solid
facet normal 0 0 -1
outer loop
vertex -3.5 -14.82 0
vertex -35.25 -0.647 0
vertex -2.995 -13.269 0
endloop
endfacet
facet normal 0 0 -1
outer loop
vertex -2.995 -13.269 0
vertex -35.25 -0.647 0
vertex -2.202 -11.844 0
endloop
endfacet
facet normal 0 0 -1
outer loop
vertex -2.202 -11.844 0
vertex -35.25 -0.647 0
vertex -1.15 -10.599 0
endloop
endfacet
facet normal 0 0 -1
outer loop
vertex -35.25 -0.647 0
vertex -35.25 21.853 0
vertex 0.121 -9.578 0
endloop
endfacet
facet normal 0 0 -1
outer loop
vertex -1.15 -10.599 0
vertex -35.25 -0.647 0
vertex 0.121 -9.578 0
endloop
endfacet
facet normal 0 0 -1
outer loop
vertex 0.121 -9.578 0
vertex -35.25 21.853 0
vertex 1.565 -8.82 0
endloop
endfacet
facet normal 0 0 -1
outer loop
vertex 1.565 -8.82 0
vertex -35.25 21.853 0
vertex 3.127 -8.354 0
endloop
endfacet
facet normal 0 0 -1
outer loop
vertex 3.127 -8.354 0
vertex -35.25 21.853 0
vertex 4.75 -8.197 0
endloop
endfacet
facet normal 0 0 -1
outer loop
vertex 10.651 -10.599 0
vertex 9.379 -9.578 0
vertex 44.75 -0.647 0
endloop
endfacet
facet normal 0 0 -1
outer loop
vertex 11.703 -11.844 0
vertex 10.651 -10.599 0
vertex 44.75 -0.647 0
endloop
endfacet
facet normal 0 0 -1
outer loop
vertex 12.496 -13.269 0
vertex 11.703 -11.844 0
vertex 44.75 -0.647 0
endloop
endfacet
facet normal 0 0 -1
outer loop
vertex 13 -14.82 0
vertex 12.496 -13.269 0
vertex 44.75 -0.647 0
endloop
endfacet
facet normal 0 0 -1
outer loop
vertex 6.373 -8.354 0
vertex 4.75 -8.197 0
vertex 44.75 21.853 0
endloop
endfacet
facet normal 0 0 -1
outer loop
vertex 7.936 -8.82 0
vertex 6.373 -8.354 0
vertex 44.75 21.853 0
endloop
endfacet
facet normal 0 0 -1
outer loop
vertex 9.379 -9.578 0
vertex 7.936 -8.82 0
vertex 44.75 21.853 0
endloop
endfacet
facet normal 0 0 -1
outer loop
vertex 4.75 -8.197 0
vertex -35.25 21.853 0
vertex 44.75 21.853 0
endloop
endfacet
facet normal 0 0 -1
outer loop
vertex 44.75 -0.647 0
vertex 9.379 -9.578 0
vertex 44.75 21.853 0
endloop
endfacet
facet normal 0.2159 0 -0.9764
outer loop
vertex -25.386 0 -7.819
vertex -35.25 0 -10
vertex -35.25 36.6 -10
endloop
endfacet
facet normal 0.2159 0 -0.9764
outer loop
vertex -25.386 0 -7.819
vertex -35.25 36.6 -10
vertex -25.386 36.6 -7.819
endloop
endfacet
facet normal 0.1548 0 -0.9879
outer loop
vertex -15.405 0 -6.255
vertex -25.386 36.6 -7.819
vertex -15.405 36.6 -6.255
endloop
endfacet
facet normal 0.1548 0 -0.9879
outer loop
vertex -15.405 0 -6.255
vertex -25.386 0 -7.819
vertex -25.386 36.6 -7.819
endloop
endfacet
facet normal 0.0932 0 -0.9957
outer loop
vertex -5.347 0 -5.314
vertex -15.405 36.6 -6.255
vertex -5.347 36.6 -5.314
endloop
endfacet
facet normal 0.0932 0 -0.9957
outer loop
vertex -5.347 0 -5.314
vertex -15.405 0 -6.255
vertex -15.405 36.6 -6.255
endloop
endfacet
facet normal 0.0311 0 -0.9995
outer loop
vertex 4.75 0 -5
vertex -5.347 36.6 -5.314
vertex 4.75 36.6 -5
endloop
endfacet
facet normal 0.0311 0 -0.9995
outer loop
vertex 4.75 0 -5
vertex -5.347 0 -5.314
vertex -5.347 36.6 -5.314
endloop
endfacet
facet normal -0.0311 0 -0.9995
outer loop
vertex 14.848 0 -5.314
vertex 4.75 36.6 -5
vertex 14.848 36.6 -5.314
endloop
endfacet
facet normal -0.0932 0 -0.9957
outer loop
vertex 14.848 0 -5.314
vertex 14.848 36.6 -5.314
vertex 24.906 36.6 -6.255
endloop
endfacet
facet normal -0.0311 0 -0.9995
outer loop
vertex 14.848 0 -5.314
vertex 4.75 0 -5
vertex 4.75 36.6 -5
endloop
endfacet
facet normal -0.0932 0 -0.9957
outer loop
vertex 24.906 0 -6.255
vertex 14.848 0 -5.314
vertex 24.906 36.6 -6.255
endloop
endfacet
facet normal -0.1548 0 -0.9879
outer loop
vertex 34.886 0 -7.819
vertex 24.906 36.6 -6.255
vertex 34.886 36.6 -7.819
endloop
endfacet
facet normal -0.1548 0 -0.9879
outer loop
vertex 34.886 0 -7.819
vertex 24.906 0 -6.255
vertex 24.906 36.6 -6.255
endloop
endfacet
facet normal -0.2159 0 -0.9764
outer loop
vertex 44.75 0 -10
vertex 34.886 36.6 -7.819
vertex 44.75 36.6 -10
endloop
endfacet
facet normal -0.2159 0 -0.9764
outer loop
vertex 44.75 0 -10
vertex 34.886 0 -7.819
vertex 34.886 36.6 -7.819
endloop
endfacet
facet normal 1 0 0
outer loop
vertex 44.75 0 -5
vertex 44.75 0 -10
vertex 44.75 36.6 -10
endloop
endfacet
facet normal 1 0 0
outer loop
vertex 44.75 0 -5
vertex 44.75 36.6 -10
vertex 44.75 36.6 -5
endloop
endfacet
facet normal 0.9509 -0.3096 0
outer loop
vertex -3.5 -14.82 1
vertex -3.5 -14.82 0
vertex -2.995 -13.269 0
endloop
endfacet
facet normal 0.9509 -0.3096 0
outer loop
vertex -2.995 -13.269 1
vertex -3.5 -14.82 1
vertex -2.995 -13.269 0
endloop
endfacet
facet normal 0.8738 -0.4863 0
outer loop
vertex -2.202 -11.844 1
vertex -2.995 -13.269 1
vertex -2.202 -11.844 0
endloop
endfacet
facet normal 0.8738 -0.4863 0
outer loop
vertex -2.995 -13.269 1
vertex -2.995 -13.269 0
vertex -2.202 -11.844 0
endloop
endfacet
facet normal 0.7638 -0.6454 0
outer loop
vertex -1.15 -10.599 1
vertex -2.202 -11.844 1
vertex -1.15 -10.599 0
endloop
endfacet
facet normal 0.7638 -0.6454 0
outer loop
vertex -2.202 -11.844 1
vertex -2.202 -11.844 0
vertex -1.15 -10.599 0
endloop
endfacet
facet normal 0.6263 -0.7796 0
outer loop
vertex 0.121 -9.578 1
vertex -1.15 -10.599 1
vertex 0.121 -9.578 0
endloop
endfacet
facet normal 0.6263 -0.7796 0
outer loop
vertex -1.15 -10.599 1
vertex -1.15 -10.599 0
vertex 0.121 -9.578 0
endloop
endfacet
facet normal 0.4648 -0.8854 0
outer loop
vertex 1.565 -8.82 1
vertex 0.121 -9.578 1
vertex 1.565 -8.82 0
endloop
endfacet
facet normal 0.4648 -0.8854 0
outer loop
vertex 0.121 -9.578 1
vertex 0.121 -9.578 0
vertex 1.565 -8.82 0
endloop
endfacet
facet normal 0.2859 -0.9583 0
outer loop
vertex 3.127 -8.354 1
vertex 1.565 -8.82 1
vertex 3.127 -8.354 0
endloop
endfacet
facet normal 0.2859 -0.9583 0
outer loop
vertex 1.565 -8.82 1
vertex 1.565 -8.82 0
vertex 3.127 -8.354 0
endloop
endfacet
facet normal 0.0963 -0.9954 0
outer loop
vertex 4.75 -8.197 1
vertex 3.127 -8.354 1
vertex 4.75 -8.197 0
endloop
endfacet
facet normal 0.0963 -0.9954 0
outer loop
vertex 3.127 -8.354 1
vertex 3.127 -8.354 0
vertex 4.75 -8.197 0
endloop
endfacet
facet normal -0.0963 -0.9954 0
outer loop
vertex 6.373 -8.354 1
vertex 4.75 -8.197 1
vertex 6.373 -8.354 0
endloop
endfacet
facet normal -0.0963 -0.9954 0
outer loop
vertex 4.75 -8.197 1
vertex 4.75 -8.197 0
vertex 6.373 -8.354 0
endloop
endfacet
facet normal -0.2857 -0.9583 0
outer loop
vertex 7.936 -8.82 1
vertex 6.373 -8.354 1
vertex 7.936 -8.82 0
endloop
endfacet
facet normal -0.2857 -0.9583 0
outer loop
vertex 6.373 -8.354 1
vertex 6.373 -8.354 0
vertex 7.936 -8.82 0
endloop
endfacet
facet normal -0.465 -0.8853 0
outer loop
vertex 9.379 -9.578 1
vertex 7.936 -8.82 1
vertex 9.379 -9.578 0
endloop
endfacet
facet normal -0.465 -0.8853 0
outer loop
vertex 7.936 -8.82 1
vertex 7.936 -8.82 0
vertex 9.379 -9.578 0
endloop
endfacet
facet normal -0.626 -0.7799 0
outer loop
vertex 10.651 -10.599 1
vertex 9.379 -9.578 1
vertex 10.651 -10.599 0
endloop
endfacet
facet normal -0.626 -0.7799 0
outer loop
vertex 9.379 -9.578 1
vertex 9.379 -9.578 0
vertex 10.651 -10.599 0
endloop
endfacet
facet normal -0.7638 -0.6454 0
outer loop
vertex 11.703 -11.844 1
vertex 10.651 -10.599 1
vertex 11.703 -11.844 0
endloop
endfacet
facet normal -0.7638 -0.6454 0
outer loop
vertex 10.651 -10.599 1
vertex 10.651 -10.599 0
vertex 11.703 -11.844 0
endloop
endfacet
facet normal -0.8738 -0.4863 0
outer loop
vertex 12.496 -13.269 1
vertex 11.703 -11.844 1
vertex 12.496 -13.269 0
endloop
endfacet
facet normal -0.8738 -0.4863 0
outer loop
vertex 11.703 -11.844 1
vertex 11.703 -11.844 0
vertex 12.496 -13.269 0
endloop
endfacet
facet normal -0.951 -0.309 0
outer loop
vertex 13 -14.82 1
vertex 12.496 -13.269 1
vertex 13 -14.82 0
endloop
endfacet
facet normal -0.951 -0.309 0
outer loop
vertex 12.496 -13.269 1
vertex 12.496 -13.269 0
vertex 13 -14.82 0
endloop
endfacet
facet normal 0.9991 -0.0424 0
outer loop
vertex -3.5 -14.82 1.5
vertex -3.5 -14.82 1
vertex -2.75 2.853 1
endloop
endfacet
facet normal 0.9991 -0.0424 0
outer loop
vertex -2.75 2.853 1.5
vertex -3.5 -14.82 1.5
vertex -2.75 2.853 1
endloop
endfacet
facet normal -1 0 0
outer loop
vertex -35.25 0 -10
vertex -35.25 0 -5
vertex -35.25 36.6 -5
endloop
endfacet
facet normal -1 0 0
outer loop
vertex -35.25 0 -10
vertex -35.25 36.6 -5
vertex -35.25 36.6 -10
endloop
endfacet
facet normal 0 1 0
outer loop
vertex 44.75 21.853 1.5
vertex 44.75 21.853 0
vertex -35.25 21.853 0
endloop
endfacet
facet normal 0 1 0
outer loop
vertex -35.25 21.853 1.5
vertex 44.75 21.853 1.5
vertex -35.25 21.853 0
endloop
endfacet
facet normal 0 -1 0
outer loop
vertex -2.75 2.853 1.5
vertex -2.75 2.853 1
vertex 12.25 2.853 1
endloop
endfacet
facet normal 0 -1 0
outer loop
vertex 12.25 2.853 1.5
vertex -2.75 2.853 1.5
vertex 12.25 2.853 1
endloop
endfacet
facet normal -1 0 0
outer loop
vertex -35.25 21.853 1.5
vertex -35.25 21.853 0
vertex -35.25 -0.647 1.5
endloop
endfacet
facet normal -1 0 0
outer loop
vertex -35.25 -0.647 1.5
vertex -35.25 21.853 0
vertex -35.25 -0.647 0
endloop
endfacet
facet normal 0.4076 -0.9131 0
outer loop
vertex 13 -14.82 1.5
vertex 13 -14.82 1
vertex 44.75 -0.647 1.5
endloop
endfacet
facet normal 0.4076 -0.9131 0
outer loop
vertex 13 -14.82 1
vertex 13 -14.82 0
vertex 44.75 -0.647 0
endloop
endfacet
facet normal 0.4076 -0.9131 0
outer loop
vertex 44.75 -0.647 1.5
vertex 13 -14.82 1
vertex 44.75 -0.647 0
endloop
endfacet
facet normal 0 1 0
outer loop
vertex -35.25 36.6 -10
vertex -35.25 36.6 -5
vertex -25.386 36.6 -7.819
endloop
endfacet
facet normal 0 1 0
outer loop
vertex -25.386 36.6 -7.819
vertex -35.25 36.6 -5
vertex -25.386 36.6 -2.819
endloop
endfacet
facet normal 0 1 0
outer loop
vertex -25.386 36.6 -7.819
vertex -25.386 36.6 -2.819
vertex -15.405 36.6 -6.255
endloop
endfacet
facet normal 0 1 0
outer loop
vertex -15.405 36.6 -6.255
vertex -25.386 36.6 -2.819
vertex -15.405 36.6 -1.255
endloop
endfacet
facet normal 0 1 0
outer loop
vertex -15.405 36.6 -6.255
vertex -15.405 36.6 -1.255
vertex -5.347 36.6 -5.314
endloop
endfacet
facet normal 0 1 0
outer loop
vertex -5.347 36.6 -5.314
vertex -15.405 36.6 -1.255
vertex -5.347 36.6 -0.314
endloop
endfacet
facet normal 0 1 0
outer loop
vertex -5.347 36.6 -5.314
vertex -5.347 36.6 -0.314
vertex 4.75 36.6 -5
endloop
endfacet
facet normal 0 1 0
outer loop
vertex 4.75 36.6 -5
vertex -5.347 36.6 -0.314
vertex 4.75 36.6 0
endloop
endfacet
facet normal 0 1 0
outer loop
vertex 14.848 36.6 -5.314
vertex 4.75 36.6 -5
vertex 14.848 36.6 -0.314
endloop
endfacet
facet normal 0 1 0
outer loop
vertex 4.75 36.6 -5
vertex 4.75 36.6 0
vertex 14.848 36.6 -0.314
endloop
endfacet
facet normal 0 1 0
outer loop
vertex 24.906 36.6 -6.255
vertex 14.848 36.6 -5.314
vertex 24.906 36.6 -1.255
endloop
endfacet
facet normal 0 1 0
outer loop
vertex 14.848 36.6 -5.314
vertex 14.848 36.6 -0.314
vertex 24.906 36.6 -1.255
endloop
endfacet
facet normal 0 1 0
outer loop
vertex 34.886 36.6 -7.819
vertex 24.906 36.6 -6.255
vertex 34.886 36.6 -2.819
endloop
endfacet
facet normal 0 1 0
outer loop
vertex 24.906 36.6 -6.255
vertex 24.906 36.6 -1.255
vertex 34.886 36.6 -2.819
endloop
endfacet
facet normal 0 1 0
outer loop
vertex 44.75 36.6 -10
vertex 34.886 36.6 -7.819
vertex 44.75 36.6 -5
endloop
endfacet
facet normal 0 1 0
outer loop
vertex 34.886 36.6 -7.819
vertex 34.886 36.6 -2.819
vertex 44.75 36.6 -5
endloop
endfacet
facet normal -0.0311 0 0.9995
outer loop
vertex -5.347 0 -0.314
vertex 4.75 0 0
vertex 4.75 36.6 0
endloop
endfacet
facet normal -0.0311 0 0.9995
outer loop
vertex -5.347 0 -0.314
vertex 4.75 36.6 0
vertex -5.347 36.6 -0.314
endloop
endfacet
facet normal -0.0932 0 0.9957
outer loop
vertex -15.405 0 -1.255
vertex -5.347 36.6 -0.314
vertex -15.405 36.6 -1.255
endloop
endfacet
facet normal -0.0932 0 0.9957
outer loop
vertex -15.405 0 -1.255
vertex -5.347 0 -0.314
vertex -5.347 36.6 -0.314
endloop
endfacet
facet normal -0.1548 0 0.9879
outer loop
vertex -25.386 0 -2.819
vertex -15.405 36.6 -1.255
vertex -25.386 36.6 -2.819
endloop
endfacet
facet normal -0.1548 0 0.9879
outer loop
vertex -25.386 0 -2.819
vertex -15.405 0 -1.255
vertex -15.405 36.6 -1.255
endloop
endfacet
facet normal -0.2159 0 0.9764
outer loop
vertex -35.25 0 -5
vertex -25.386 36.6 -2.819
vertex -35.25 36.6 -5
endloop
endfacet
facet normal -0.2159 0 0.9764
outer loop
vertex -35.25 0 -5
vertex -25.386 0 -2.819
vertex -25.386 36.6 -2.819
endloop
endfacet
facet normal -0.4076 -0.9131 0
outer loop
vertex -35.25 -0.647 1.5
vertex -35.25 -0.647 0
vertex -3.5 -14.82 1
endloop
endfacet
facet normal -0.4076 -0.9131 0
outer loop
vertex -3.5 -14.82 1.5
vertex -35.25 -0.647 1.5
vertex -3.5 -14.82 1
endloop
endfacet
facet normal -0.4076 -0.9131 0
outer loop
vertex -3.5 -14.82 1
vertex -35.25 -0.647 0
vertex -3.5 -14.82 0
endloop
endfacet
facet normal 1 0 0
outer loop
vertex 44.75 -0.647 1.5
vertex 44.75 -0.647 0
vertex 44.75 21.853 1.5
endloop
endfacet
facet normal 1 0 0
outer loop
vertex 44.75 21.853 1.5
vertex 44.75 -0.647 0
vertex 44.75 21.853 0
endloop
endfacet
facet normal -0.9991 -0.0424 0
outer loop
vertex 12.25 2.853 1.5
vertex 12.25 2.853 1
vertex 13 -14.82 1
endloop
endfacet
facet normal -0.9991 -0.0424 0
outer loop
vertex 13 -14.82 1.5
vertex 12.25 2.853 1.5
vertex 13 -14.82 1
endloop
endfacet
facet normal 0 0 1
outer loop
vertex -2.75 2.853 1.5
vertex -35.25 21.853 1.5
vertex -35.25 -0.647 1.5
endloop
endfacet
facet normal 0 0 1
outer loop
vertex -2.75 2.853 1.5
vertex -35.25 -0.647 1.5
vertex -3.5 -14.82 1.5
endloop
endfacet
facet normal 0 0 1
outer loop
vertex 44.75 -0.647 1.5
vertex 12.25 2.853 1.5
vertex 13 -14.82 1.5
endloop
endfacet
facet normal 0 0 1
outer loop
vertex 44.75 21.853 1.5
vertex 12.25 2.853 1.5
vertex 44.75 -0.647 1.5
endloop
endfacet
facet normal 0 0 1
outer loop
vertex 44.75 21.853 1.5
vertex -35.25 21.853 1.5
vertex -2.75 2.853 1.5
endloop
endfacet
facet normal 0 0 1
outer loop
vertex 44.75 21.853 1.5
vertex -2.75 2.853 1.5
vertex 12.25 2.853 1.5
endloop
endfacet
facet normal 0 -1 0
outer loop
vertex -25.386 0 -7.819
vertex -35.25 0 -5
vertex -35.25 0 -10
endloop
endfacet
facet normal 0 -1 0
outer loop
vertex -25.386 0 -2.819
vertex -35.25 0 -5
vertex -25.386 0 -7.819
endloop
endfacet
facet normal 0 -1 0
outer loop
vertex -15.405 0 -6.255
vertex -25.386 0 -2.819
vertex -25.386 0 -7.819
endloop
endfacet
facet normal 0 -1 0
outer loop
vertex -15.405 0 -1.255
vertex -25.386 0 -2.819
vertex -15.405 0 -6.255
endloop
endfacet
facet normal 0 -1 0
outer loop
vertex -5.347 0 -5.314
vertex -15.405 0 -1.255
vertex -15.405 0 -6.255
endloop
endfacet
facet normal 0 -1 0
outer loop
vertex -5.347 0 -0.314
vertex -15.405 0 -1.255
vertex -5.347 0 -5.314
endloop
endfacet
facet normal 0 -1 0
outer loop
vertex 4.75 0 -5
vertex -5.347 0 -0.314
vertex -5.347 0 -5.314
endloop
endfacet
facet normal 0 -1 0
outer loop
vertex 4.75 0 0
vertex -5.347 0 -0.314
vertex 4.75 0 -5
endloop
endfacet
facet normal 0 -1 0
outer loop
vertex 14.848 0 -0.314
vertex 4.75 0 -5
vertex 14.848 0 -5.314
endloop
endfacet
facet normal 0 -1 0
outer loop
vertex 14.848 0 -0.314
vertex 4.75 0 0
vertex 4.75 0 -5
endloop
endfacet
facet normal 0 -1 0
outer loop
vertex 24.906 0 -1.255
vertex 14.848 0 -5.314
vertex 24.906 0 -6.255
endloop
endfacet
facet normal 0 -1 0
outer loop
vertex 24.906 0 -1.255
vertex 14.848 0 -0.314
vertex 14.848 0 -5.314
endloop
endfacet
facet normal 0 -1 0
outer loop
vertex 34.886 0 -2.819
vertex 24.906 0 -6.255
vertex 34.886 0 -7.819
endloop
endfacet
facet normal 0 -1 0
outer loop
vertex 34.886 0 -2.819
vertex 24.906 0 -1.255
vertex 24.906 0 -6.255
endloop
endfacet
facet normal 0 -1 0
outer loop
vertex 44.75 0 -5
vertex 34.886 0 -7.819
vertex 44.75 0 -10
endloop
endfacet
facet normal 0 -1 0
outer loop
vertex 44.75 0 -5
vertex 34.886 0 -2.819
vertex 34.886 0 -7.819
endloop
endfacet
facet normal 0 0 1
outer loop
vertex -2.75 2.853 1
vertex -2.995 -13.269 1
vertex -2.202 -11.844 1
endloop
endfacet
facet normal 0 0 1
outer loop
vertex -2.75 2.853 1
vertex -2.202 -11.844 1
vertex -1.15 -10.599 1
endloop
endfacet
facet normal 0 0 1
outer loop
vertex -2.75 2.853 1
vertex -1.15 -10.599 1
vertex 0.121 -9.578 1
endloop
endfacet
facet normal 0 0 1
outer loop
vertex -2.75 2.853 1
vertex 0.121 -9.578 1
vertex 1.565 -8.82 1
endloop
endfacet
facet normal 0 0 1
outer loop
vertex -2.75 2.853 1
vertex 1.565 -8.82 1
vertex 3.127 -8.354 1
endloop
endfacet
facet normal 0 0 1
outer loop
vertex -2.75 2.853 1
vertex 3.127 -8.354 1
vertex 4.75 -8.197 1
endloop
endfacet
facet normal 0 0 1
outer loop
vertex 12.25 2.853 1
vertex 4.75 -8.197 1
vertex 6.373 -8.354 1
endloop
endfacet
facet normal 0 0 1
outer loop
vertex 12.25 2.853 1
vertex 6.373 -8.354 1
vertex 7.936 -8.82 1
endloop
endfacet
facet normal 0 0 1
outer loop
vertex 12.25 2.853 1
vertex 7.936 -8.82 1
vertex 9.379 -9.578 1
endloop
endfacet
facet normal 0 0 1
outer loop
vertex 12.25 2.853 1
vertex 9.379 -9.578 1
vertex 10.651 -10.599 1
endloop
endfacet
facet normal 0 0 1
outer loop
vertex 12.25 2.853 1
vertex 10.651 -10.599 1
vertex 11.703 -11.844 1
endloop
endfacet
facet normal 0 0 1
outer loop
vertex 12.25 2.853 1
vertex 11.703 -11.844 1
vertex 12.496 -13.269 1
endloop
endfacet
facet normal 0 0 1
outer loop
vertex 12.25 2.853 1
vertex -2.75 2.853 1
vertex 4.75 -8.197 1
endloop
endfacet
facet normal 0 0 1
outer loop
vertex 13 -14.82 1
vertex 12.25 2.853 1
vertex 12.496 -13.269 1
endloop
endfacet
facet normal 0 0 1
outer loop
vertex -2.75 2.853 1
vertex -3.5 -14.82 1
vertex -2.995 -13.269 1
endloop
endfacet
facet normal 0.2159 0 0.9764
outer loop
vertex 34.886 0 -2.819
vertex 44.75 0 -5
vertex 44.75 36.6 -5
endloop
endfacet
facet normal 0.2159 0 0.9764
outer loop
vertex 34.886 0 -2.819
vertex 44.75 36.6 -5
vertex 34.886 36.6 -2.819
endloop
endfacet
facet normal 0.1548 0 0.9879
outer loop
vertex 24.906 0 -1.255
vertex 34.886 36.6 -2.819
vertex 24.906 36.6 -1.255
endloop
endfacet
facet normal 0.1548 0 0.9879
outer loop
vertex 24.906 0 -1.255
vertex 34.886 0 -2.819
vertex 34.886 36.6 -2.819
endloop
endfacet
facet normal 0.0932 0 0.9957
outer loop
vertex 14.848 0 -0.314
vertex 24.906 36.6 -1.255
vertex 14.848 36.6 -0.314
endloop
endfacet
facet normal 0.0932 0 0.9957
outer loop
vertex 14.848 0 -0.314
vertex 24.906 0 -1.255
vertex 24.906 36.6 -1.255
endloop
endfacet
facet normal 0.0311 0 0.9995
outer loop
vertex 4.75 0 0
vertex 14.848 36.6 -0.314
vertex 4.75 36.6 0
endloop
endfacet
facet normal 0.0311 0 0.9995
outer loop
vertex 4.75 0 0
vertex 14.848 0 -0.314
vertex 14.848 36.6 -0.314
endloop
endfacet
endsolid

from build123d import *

# Parameters (mm, degrees)
F1_DEPTH = 1.5
F2_DEPTH = 1
F4_DEPTH = 36.6


with BuildPart() as f1:
    # F0 (on Top) → F1 (new body)
    with BuildSketch(Plane.XY):
        Polygon((12.250248, 2.852923), (13.000248, -14.81951), (44.750248, -0.647077), (44.750248, 21.852923), (-35.249752, 21.852923), (-35.249752, -0.647077), (-3.499752, -14.81951), (-2.749752, 2.852923), (4.750248, 2.852923), align=None)
    extrude(amount=F1_DEPTH)

    # F0 (on Top) → F2 (join)
    with BuildSketch(Plane.XY):
        with BuildLine():
            ThreePointArc((-3.499752, -14.81951), (4.750248, -8.197077), (13.000248, -14.81951))
            Line((13.000248, -14.81951), (12.250248, 2.852923))
            Line((12.250248, 2.852923), (4.750248, 2.852923))
            Line((4.750248, 2.852923), (-2.749752, 2.852923))
            Line((-2.749752, 2.852923), (-3.499752, -14.81951))
        make_face()
    extrude(amount=F2_DEPTH)


with BuildPart() as f4:
    # F3 (on Front) → F4 (new body)
    with BuildSketch(Plane.XZ):
        with BuildLine():
            Line((-35.249752, -5), (-35.249752, -10))
            ThreePointArc((-35.249752, -10), (4.750248, -5), (44.750248, -10))
            Line((44.750248, -10), (44.750248, -5))
            ThreePointArc((44.750248, -5), (24.905892, -1.254845), (4.750248, 0))
            ThreePointArc((4.750248, 0), (-15.405396, -1.254845), (-35.249752, -5))
        make_face()
    extrude(amount=-F4_DEPTH)


solid = Compound([f1.part, f4.part])
